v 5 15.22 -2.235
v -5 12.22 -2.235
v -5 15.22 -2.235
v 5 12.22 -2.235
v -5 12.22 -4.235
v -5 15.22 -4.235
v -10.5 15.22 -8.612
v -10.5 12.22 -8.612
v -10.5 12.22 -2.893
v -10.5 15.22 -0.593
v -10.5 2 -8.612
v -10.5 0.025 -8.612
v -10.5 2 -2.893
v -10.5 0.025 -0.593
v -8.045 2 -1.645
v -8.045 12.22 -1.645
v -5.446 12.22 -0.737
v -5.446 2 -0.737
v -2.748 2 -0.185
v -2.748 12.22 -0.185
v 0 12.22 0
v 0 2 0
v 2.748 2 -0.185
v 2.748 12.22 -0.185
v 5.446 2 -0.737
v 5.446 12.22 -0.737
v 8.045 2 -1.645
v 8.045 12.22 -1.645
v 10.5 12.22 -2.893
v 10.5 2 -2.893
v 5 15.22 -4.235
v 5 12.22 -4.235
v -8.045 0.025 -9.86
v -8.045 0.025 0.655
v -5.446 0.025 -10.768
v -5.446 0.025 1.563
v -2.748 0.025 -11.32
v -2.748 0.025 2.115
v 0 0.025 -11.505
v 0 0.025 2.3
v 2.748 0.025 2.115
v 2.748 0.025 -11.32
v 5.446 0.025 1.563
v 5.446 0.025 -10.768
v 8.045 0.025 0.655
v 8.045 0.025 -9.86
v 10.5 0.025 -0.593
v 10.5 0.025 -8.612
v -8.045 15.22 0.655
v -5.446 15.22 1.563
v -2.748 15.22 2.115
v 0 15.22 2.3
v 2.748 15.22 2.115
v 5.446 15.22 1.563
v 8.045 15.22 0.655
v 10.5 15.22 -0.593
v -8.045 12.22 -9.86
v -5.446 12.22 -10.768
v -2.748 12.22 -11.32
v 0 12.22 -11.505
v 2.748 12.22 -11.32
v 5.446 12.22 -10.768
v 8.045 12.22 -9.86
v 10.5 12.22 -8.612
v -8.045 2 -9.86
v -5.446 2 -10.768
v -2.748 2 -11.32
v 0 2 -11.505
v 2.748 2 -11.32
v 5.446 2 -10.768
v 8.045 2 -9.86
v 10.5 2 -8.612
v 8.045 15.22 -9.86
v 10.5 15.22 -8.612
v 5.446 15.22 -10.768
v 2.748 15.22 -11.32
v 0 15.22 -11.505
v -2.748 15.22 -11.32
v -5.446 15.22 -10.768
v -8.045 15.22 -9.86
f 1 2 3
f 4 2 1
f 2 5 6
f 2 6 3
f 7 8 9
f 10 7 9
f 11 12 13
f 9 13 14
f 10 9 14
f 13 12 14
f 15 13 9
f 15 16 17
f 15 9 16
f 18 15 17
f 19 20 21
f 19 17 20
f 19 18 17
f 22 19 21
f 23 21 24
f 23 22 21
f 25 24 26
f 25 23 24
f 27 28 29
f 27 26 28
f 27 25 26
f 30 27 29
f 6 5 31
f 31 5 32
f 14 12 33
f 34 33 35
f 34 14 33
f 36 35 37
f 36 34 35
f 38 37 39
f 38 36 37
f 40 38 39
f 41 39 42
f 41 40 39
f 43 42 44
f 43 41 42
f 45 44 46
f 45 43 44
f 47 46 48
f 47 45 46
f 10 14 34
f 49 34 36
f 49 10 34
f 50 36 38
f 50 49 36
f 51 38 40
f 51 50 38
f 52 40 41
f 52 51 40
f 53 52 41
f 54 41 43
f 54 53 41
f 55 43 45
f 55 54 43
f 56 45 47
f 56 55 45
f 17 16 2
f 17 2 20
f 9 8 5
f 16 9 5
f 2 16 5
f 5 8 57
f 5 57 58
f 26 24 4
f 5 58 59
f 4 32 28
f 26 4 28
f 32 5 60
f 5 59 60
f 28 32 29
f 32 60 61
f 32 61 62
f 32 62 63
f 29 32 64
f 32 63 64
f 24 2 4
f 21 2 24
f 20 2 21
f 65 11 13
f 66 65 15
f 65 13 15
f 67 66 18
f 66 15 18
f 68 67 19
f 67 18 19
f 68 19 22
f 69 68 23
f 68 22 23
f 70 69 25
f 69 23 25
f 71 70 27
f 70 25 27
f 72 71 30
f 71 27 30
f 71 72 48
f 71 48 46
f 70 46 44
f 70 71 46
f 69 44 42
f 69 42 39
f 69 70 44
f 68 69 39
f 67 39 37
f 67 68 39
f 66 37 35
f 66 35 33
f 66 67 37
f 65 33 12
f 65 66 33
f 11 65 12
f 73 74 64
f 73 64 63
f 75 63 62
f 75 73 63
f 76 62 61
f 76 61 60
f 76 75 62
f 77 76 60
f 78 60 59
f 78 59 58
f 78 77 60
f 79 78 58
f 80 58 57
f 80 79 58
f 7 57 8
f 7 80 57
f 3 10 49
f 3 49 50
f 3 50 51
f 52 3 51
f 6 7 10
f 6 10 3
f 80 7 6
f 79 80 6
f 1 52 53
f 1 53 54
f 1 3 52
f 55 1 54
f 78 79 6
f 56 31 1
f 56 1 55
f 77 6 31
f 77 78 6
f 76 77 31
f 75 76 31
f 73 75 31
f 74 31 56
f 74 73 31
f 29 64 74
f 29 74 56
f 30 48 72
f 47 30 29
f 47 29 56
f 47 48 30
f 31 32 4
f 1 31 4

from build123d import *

# Parameters (mm, degrees)
BOSS_EXTRUDE1_DEPTH     = 15.21999998
SKETCH2_W               = 36.809677156
SKETCH2_H               = 26.071604974
BOSS_EXTRUDE2_DEPTH     = 3
SKETCH3_W               = 36.809677156
SKETCH3_H               = 26.071604974
BOSS_EXTRUDE3_DEPTH     = 2
SKETCH4_W               = 60.36112228
SKETCH4_H               = 157.574347664
SKETCH4_W_2             = 21
SKETCH4_H_2             = 111.767475737
CUT_EXTRUDE1_DEPTH      = 38.576
SKETCH5_W               = 10
SKETCH5_H               = 2
CUT_EXTRUDE2_DEPTH      = 38.576
SKETCH6_W               = 35.571492448
SKETCH6_H               = 20.32
CUT_EXTRUDE3_DEPTH      = 25.876
CUT_EXTRUDE3_DEPTH_BACK = 20.32
SKETCH7_W               = 25.588268566
SKETCH7_H               = 5
CUT_EXTRUDE4_DEPTH      = 25.876
SKETCH10_R              = 48.677475689
SKETCH10_R_2            = 20.5
CUT_EXTRUDE5_DEPTH      = 14.478
CUT_EXTRUDE5_DEPTH_BACK = 169.64
BOSS_EXTRUDE4_DEPTH     = 15.208
SKETCH12_W              = 30.501346117
SKETCH12_H              = 25.675497492
CUT_EXTRUDE8_DEPTH      = 8.604
CUT_EXTRUDE8_DEPTH_BACK = 0.0254
SKETCH13_W              = 21
SKETCH13_H              = 10.21999998
CUT_EXTRUDE9_DEPTH      = 8.604


with BuildPart() as part:
    # Sketch1 → Boss-Extrude1 (new body)
    with BuildSketch(Plane(origin=(0, 0, 0), x_dir=(1, 0, 0), z_dir=(0, 1, 0))):
        with BuildLine():
            Line((18.404838578, -7.300000132), (-18.404838578, -7.300000132))
            Line((-18.404838578, -7.300000132), (-18.404838578, 7.300000132))
            Line((-18.404838578, 7.300000132), (-18.404838578, 11.471604964))
            ThreePointArc((-18.404838578, 11.471604964), (0, 0), (18.404838578, 11.471604964))
            Line((18.404838578, 11.471604964), (18.404838578, 7.300000132))
            Line((18.404838578, 7.300000132), (18.404838578, -7.300000132))
        make_face()
    extrude(amount=BOSS_EXTRUDE1_DEPTH)

    # Sketch2 → Boss-Extrude2 (add)
    with BuildSketch(Plane(origin=(0, 15.21999998, 0), x_dir=(1, 0, 0), z_dir=(0, 1, 0))):
        with Locations((0, 5.735802355)):
            Rectangle(SKETCH2_W, SKETCH2_H)
    extrude(amount=-BOSS_EXTRUDE2_DEPTH)

    # Sketch3 → Boss-Extrude3 (add)
    with BuildSketch(Plane.XZ):
        with Locations((0, -5.735802355)):
            Rectangle(SKETCH3_W, SKETCH3_H)
    extrude(amount=-BOSS_EXTRUDE3_DEPTH)

    # Sketch4 → Cut-Extrude1 (cut)
    with BuildSketch(Plane.XZ):
        with Locations((0, -3.625194089)):
            Rectangle(SKETCH4_W, SKETCH4_H)
        with Locations((0, -3.62519409)):
            Rectangle(SKETCH4_W_2, SKETCH4_H_2, mode=Mode.SUBTRACT)
    extrude(amount=-CUT_EXTRUDE1_DEPTH, mode=Mode.SUBTRACT)

    # Sketch5 → Cut-Extrude2 (cut)
    with BuildSketch(Plane.XZ.offset(-12.21999998)):
        with Locations((0, -3.2352)):
            Rectangle(SKETCH5_W, SKETCH5_H)
    extrude(amount=-CUT_EXTRUDE2_DEPTH, mode=Mode.SUBTRACT)

    # Sketch6 → Cut-Extrude3 (cut, two sides)
    with BuildSketch(Plane.XZ.offset(-12.21999998)) as cut_extrude3_sk:
        with Locations((0, -18.771604842)):
            Rectangle(SKETCH6_W, SKETCH6_H)
    extrude(amount=CUT_EXTRUDE3_DEPTH, mode=Mode.SUBTRACT)
    extrude(cut_extrude3_sk.sketch, amount=-CUT_EXTRUDE3_DEPTH_BACK, mode=Mode.SUBTRACT)

    # Sketch7 → Cut-Extrude4 (cut)
    with BuildSketch(Plane(origin=(0, 15.21999998, 0), x_dir=(1, 0, 0), z_dir=(0, 1, 0))):
        with Locations((0, -7.300000132)):
            Rectangle(SKETCH7_W, SKETCH7_H)
    extrude(amount=-CUT_EXTRUDE4_DEPTH, mode=Mode.SUBTRACT)

    # Sketch10 → Cut-Extrude5 (cut, two sides)
    with BuildSketch(Plane(origin=(0, 15.21999998, 0), x_dir=(1, 0, 0), z_dir=(0, 1, 0))) as cut_extrude5_sk:
        with Locations((0, 18.199999842)):
            Circle(SKETCH10_R)
        with Locations((0, 18.199999842)):
            Circle(SKETCH10_R_2, mode=Mode.SUBTRACT)
    extrude(amount=CUT_EXTRUDE5_DEPTH, mode=Mode.SUBTRACT)
    extrude(cut_extrude5_sk.sketch, amount=-CUT_EXTRUDE5_DEPTH_BACK, mode=Mode.SUBTRACT)

    # Sketch11 → Boss-Extrude4 (add)
    with BuildSketch(Plane(origin=(0, 15.21999998, 0), x_dir=(1, 0, 0), z_dir=(0, 1, 0))):
        with BuildLine():
            Line((-10.5, 8.611604842), (10.5, 8.611604842))
            ThreePointArc((10.5, 8.611604842), (0, 11.50478798), (-10.5, 8.611604842))
        make_face()
    extrude(amount=-BOSS_EXTRUDE4_DEPTH)

    # Sketch12 → Cut-Extrude8 (cut, two sides)
    with BuildSketch(Plane.XZ) as cut_extrude8_sk:
        with Locations((1.361590216, -5.971942541)):
            Rectangle(SKETCH12_W, SKETCH12_H)
    extrude(amount=CUT_EXTRUDE8_DEPTH, mode=Mode.SUBTRACT)
    extrude(cut_extrude8_sk.sketch, amount=-CUT_EXTRUDE8_DEPTH_BACK, mode=Mode.SUBTRACT)

    # Sketch13 → Cut-Extrude9 (cut)
    with BuildSketch(Plane.XY.offset(-8.611604842)):
        with Locations((0, 7.10999999)):
            Rectangle(SKETCH13_W, SKETCH13_H)
    extrude(amount=-CUT_EXTRUDE9_DEPTH, mode=Mode.SUBTRACT)


solid = part.part
